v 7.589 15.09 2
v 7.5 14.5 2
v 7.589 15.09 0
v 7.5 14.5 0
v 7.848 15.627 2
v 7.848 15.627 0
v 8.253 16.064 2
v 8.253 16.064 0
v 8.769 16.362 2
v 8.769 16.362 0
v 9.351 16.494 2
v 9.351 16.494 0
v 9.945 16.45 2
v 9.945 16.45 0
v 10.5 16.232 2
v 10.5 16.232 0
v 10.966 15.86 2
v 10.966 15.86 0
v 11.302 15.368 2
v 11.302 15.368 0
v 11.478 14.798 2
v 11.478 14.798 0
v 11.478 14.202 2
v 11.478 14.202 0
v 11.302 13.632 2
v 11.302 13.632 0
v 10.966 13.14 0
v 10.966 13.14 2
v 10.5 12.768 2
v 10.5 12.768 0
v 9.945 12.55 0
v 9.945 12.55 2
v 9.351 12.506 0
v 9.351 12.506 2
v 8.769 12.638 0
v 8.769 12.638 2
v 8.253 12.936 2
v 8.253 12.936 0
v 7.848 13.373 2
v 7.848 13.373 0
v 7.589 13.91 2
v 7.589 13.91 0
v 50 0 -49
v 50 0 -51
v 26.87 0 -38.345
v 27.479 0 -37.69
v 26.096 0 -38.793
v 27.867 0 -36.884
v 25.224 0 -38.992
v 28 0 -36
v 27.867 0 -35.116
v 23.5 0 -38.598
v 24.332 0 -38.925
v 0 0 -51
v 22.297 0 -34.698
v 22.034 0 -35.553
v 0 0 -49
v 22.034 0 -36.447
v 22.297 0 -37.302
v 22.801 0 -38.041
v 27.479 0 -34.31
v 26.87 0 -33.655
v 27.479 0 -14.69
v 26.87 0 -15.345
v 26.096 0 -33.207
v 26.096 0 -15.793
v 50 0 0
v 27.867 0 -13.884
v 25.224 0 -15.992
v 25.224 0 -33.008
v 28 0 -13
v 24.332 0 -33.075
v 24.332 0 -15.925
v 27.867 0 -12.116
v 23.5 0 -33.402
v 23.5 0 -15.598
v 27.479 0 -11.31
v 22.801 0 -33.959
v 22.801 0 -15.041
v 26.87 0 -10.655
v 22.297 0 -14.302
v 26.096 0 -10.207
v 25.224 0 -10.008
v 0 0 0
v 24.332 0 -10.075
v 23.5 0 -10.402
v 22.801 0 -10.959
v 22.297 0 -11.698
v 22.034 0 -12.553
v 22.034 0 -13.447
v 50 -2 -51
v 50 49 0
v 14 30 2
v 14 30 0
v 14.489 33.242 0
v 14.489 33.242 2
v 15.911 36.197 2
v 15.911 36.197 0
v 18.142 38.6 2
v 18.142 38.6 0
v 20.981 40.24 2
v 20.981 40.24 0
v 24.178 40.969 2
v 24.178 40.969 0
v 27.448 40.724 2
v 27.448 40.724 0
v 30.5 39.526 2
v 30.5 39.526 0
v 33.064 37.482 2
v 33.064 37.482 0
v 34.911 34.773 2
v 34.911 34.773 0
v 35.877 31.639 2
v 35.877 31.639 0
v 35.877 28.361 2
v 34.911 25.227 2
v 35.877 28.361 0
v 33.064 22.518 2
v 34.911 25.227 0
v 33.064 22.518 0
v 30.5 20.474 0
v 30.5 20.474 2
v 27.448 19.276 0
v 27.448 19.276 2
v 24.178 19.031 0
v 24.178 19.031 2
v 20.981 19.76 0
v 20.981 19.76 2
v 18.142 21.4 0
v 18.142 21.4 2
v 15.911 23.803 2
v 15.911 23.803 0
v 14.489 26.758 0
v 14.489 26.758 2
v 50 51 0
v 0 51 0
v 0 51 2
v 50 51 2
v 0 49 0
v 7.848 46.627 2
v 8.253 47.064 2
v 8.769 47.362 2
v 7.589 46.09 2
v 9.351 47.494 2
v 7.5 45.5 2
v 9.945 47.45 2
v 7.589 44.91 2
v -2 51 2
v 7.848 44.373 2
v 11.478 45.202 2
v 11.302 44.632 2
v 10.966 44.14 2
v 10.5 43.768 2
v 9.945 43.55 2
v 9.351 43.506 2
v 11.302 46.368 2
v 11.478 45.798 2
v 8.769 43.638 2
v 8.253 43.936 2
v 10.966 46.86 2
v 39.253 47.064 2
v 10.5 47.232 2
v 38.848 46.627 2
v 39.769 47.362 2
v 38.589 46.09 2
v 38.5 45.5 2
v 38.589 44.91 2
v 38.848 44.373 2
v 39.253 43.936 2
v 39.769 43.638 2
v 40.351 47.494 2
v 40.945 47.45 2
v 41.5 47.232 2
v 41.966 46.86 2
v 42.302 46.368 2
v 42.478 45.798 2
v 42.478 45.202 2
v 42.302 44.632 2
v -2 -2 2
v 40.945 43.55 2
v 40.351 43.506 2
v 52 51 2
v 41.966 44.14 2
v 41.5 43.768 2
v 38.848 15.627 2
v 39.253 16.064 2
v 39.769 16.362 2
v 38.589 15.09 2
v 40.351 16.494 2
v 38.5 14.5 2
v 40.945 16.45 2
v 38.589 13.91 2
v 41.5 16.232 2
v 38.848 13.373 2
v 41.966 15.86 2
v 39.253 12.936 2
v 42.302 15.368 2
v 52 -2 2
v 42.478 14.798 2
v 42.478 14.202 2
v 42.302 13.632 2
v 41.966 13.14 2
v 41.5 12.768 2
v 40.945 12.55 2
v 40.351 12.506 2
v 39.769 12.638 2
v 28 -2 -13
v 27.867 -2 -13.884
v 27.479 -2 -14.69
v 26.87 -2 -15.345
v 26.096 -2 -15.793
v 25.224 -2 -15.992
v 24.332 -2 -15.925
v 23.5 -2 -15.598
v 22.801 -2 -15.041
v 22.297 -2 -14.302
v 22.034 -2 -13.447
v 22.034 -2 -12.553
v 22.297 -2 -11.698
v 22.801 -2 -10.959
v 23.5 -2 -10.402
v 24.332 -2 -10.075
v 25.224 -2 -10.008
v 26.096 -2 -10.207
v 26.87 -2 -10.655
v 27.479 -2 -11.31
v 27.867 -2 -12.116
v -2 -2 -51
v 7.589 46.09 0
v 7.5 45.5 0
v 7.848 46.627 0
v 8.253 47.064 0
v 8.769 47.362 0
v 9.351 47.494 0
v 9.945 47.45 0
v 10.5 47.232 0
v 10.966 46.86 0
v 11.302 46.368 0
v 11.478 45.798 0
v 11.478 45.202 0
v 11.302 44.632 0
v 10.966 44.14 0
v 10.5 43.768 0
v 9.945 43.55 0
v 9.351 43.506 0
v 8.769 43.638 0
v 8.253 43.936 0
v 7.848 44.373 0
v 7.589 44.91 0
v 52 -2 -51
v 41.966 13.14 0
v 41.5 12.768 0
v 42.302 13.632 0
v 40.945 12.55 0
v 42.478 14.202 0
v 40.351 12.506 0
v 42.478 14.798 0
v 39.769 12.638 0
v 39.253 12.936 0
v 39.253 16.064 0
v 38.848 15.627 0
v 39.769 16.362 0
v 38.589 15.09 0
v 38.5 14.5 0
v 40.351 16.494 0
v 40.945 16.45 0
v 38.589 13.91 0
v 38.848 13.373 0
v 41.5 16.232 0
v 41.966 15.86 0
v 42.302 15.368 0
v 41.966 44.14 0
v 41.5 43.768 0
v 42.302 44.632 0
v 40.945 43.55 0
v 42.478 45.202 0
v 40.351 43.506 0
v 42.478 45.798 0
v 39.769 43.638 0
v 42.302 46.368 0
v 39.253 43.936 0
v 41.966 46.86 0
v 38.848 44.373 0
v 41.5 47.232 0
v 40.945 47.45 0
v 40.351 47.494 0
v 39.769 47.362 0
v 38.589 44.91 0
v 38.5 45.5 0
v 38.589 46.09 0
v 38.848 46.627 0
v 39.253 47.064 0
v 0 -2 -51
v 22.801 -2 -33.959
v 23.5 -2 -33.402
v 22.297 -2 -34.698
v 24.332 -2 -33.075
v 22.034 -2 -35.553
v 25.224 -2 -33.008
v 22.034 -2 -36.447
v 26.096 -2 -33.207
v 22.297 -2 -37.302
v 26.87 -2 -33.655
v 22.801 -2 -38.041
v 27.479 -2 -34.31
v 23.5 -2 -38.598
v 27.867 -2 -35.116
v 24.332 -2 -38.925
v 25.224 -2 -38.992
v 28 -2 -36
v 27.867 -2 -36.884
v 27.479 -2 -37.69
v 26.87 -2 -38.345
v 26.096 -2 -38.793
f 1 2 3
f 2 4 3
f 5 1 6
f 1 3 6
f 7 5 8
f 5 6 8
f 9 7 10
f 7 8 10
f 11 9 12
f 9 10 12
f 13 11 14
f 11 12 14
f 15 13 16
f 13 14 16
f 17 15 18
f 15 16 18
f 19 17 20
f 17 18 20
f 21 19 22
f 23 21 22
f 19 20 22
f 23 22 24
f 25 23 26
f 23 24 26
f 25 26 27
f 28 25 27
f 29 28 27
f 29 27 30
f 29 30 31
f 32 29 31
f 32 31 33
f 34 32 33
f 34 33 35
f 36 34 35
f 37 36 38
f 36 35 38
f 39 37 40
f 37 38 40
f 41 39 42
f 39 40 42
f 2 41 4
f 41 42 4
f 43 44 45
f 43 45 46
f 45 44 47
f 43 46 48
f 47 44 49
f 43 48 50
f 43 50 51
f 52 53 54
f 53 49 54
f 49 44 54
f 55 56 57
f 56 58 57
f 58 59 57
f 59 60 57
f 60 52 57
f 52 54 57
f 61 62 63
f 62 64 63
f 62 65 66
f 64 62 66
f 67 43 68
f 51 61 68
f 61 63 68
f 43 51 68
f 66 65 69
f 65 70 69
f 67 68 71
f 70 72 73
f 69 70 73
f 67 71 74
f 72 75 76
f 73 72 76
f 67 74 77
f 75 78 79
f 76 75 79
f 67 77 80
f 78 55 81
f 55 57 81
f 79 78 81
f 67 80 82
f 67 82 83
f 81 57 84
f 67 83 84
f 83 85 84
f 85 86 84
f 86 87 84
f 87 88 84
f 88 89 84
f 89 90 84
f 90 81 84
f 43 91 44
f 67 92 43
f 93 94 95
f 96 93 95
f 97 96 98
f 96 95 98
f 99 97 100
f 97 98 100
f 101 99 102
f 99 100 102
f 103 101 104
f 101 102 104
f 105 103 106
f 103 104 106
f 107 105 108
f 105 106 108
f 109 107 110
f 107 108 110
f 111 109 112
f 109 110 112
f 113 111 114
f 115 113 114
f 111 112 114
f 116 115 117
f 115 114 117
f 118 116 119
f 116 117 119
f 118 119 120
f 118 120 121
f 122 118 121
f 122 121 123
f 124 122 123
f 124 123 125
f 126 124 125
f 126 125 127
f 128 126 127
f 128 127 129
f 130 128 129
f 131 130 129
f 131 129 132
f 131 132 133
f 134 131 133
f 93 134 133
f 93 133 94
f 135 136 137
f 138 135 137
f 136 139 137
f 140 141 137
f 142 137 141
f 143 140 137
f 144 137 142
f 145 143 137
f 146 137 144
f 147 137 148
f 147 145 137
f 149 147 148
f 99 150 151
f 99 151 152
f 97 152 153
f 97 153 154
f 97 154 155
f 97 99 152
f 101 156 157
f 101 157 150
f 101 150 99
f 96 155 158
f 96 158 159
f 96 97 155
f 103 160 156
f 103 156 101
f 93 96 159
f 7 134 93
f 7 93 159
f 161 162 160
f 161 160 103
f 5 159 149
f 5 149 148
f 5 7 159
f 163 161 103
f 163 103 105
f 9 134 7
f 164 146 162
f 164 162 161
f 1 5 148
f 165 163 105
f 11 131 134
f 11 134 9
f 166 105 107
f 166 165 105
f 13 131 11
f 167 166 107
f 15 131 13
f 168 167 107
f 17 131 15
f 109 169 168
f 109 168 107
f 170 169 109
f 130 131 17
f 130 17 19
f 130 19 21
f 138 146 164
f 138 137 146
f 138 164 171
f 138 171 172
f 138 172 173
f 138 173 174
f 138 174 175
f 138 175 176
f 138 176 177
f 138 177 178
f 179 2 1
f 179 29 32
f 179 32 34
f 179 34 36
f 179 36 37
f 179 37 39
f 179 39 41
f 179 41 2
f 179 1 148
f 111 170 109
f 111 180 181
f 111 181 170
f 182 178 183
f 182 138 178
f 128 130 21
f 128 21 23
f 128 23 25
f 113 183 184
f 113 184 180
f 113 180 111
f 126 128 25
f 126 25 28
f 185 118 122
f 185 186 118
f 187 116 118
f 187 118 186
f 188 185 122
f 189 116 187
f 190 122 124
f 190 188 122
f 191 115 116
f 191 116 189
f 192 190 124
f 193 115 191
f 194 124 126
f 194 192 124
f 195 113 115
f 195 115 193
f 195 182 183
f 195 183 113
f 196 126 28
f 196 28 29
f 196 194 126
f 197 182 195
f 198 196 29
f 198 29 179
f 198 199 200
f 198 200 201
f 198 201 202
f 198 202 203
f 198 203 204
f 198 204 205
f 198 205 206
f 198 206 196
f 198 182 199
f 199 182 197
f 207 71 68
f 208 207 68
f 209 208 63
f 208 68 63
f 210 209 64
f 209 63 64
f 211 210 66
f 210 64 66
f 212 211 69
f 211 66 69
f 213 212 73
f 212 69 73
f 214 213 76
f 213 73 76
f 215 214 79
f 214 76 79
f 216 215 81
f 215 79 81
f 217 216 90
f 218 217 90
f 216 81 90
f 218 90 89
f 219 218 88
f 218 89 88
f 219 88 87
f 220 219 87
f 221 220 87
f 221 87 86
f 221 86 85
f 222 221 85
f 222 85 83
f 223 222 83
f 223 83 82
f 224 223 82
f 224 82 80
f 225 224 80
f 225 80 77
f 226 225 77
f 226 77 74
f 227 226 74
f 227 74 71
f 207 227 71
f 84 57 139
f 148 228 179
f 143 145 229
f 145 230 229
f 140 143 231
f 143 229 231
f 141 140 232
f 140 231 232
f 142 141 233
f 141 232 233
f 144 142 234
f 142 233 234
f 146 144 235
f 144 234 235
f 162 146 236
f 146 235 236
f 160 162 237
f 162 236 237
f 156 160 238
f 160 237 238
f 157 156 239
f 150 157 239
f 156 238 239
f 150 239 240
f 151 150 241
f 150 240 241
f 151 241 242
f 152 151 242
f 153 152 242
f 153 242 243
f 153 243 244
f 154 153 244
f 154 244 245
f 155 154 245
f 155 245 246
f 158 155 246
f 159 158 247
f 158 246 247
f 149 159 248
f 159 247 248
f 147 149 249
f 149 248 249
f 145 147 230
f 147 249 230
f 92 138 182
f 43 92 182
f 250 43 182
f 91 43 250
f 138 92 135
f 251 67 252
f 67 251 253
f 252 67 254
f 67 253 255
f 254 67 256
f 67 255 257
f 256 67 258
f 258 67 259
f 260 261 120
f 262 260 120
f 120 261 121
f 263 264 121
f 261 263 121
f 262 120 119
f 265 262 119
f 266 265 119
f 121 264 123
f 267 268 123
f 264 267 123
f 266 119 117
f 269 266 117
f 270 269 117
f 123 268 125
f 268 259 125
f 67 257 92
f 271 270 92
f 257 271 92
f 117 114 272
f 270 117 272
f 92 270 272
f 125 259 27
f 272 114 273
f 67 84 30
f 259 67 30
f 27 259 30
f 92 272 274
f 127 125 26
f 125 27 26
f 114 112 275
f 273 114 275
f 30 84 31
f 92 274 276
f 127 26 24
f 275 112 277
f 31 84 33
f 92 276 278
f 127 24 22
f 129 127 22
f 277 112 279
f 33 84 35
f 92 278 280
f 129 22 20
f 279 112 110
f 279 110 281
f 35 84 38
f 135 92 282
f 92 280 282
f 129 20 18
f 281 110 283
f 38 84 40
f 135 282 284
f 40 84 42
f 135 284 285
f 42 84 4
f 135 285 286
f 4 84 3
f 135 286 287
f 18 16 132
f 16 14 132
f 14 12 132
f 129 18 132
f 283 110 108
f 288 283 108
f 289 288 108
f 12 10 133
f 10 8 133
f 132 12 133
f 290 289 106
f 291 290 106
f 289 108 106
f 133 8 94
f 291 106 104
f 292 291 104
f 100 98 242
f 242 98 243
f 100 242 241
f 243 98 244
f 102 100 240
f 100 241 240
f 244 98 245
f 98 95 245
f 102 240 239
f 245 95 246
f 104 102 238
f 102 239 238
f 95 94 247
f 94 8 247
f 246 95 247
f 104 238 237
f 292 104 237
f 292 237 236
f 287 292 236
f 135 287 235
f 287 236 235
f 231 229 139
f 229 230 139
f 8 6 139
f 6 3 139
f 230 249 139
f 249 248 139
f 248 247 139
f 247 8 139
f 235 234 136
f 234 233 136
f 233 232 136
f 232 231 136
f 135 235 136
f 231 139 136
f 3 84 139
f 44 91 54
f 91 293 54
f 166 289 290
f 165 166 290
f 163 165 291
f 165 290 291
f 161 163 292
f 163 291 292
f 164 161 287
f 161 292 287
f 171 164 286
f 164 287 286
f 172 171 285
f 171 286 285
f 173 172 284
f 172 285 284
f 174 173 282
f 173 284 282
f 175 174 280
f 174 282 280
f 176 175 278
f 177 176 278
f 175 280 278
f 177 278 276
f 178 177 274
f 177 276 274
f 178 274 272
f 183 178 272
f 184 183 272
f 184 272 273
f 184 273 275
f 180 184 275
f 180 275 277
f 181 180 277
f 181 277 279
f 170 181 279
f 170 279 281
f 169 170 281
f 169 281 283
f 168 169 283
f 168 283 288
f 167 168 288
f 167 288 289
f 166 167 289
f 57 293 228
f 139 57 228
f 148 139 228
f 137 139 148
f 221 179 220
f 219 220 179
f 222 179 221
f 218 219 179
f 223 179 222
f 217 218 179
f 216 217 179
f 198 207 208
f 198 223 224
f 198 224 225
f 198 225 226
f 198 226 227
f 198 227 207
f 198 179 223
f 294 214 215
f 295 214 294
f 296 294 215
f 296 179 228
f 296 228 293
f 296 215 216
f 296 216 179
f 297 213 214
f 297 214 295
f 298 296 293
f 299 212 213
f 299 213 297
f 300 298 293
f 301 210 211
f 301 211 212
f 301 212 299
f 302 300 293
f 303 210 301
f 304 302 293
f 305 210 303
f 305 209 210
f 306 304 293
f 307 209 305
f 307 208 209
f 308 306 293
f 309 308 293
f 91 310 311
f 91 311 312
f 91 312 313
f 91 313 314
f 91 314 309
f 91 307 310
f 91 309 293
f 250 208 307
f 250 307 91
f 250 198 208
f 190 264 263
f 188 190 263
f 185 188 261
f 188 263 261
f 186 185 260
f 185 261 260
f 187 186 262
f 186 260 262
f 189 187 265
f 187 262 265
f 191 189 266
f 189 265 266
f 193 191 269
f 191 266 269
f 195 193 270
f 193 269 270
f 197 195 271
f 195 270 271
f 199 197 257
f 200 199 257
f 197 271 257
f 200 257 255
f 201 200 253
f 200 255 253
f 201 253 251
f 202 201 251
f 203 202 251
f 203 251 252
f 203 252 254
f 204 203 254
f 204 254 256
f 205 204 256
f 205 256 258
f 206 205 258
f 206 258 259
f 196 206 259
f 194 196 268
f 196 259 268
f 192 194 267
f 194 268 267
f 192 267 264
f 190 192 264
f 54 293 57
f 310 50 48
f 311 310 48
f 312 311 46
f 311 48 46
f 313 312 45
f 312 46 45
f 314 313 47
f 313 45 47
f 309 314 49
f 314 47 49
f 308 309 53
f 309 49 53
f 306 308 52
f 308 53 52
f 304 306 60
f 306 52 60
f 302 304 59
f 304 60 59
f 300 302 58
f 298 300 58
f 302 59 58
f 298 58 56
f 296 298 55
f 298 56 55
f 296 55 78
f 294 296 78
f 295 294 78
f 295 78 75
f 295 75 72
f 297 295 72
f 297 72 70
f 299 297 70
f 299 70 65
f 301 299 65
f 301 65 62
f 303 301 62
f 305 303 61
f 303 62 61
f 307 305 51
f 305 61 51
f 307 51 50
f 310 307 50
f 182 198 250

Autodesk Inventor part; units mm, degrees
ref_plane "YZ Plane" through (0, 0, 0) normal (1, 0, 0) x (0, 1, 0)
ref_plane "XZ Plane" through (0, 0, 0) normal (0, 1, 0) x (-1, 0, 0)
ref_plane "XY Plane" through (0, 0, 0) normal (0, 0, 1) x (1, 0, 0)
sketch "Sketch1" plane through (0, 0, 0) normal (1, 0, 0) x (0, 1, 0)
  line L0 (0, 0) -> (51, 0)
  line L1 (51, 0) -> (51, 2)
  line L2 (51, 2) -> (0, 2)
  line L3 (-2, 0) -> (-2, -51)
  line L4 (-2, -51) -> (0, -51)
  line L5 (0, -51) -> (0, 0)
  line L6 (0, 0) -> (-2, 0)
  line L7 (-2, 0) -> (-2, 2)
  line L8 (-2, 2) -> (0, 2)
  line L9 (0, 2) -> (0, 0)
  dimension "d0" = 51
  dimension "d1" = 2
  dimension "d2" = 2
  dimension "d3" = 51
extrude "Extrusion1" add sketch "Sketch1" along normal blind 50
sketch "Sketch2" plane through (0, 0, 0) normal (0, 0, -1) x (-1, 0, 0)
  line L0 (0, 51) -> (-50, 51) projected
  line L1 (-25, 51) -> (-25, 30)
  circle A0 centre (-25, 30) radius 11
  line L2 (-25, 51) -> (-9.5, 51)
  line L3 (-25, 30) -> (-9.5, 30)
  line L4 (-9.5, 30) -> (-9.5, 45.5)
  line L5 (-9.5, 30) -> (-9.5, 14.5)
  circle A1 centre (-9.5, 14.5) radius 2
  circle A2 centre (-9.5, 45.5) radius 2
  circle A3 centre (-40.5, 14.5) radius 2
  circle A4 centre (-40.5, 45.5) radius 2
  point P0 (0, 0)
  dimension "d6" = 21
  dimension "d7" = 22
  dimension "d8" = 15.5
  dimension "d9" = 15.5
  dimension "d10" = 15.5
  dimension "d11" = 4
  dimension "d12" = 4
extrude "Extrusion2" cut sketch "Sketch2" against normal blind 50
sketch "Sketch3" plane through (0, 0, 0) normal (0, 1, 0) x (1, 0, 0)
  line L0 (0, 51) -> (50, 51) projected
  line L1 (25, 51) -> (25, 36)
  line L2 (25, 36) -> (25, 13)
  circle A0 centre (25, 13) radius 3
  circle A1 centre (25, 36) radius 3
  point P0 (0, 0)
  dimension "d15" = 15
  dimension "d16" = 23
  dimension "d17" = 6
  dimension "d18" = 6
extrude "Extrusion3" cut sketch "Sketch3" against normal blind 50
sketch "Sketch4" plane through (50, 0, 0) normal (1, 0, 0) x (0, 0, -1)
  line L0 (-2, 51) -> (-2, -2) projected
  line L1 (-2, -2) -> (51, -2)
  line L2 (51, -2) -> (51, 51)
  line L3 (51, 51) -> (-2, 51)
  line L4 (-2, 51) -> (-2, -2)
  line L5 (-2, 51) -> (51, -2)
  point P0 (0, 0)
  dimension "d21" = 53
extrude "Extrusion4" add sketch "Sketch4" along normal blind 2 contours L5 L1 L0
sketch "Sketch5" plane through (0, 0, 0) normal (-1, 0, 0) x (0, 0, 1)
  line L0 (2, -2) -> (-51, -2) projected
  line L1 (2, -2) -> (-51, -2)
  line L2 (-51, -2) -> (-51, 51)
  line L3 (-51, 51) -> (2, 51)
  line L4 (2, 51) -> (2, -2)
  line L5 (-51, -2) -> (2, 51)
  point P0 (0, 0)
  dimension "d24" = 53
  dimension "d25" = 53
extrude "Extrusion5" add sketch "Sketch5" along normal blind 2 contours L0 L5 L4
properties part number "NEMA17-3030-m6-holder" material "Aluminum 6061"
